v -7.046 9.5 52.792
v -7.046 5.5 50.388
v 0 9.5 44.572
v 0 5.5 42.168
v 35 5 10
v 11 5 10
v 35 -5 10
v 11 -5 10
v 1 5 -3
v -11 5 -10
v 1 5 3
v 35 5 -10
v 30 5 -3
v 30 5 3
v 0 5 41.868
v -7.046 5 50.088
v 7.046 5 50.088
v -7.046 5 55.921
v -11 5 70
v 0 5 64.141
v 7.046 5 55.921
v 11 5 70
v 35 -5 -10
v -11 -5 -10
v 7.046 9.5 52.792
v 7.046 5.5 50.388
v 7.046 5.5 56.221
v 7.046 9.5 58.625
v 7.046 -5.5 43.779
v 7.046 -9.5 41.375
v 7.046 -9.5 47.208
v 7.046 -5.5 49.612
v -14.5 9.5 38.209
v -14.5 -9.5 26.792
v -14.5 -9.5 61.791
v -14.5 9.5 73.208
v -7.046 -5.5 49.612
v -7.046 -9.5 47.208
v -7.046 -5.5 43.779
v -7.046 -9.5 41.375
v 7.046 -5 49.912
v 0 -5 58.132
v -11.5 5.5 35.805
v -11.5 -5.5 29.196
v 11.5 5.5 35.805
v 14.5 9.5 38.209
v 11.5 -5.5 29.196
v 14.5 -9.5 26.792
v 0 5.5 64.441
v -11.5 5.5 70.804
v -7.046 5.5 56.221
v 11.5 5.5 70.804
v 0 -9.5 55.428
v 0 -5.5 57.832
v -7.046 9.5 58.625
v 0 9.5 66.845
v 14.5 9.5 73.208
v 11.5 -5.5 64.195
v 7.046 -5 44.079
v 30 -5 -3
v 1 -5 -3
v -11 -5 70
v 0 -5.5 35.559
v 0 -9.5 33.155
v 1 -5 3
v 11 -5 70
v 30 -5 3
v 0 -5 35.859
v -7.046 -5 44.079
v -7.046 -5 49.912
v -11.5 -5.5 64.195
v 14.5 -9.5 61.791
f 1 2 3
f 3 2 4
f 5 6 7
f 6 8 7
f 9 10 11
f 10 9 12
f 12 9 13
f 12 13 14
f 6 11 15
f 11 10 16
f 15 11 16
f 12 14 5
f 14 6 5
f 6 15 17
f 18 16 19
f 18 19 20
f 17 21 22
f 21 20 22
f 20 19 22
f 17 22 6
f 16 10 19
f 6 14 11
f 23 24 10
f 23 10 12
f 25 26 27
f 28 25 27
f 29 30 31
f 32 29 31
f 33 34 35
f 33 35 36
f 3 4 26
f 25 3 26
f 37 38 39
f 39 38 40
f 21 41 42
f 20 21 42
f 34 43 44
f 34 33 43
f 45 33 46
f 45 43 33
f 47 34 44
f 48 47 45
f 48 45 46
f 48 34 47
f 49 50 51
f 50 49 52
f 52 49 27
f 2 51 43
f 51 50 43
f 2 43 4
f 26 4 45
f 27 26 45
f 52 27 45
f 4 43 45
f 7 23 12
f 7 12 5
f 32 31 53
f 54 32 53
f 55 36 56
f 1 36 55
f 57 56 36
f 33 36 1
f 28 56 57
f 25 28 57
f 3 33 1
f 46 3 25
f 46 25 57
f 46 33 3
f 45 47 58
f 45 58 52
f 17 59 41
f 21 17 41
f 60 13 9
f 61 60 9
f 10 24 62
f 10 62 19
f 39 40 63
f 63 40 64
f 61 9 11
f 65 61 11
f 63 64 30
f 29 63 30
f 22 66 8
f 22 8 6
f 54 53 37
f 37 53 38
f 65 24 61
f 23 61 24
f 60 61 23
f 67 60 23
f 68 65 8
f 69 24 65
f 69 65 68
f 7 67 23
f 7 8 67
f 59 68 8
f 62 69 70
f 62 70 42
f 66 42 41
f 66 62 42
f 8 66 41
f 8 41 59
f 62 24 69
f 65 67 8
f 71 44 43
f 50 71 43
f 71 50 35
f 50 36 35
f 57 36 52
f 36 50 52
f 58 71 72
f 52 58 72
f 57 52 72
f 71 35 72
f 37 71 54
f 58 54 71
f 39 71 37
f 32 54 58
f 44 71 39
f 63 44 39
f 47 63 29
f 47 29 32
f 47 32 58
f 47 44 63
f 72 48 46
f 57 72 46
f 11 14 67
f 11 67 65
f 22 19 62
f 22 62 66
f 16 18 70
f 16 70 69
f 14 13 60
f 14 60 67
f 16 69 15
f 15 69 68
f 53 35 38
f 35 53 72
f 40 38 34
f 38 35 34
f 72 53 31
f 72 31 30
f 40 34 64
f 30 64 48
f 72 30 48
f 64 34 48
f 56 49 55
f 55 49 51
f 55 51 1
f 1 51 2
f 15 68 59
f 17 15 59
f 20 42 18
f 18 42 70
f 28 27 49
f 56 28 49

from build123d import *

# Parameters (mm, degrees)
F0_W          = 22
F0_H          = 10
F1_DEPTH      = 70
F1_DEPTH_BACK = 10
F2_START      = 20
F0_W_2        = 29
F0_H_2        = 19
F0_W_3        = 23
F0_H_3        = 11
F2_DEPTH      = 60
F4_DEPTH      = 25
F5_ANGLE      = -31
F3_W          = 40
F3_H          = 30
F7_DEPTH      = 25
F8_ANGLE      = -31
F10_W         = 24
F10_H         = 20
F11_DEPTH     = 5
F12_W         = 29
F12_H         = 6
F13_DEPTH     = 25


with BuildPart() as f1:
    # F0 (on Top) → F1 (new body, two sides)
    with BuildSketch(Plane.XY) as f1_sk:
        Rectangle(F0_W, F0_H)
    extrude(amount=F1_DEPTH)
    extrude(f1_sk.sketch, amount=-F1_DEPTH_BACK)


with BuildPart() as f2:
    # F0 (on Top) → F2 (new body)
    with BuildSketch(Plane.XY.offset(F2_START)):
        Rectangle(F0_W_2, F0_H_2)
        Rectangle(F0_W_3, F0_H_3, mode=Mode.SUBTRACT)
    extrude(amount=F2_DEPTH)


with BuildPart() as f4:
    # F3 (on Front) → F4 (new body, symmetric)
    with BuildSketch(Plane.XZ):
        Polygon((7.045941546, 52.5), (0, 59.545941546), (-7.045941546, 52.5), (-7.045941546, 47.5), (0, 40.454058454), (7.045941546, 47.5), align=None)
    extrude(amount=F4_DEPTH, both=True)


with BuildPart() as f4_1:
    # F5: moved
    add(f4.part.rotate(Axis((-13.5051338822, 0, 50), (-1, 0, 0)), F5_ANGLE))


with BuildPart() as f2_1:
    add(f2.part)

    # F6: cut F4
    add(f4_1.part, mode=Mode.SUBTRACT)


with BuildPart() as f1_1:
    add(f1.part)

    # F6: cut F4
    add(f4_1.part, mode=Mode.SUBTRACT)

    # F10 (on Front) → F11 (join, symmetric)
    with BuildSketch(Plane.XZ):
        with Locations((23, 0)):
            Rectangle(F10_W, F10_H)
    extrude(amount=F11_DEPTH, both=True)

    # F12 (on face) → F13 (cut)
    with BuildSketch(Plane(origin=(0, 5, 0), x_dir=(-1, 0, 0), z_dir=(0, 1, 0))):
        with Locations((-15.5, 0)):
            Rectangle(F12_W, F12_H)
    extrude(amount=-F13_DEPTH, mode=Mode.SUBTRACT)


with BuildPart() as f7:
    # F3 (on Front) → F7 (new body, symmetric)
    with BuildSketch(Plane.XZ):
        with Locations((0, 50)):
            Rectangle(F3_W, F3_H)
        Polygon((-7.045941546, 52.5), (0, 59.545941546), (7.045941546, 52.5), (7.045941546, 47.5), (0, 40.454058454), (-7.045941546, 47.5), align=None, mode=Mode.SUBTRACT)
        Polygon((7.045941546, 52.5), (0, 59.545941546), (-7.045941546, 52.5), (-7.045941546, 47.5), (0, 40.454058454), (7.045941546, 47.5), align=None)
    extrude(amount=F7_DEPTH, both=True)


with BuildPart() as f7_1:
    # F8: moved
    add(f7.part.rotate(Axis((-13.5051338822, 0, 50), (-1, 0, 0)), F8_ANGLE))

    # F9: intersect F2
    add(f2_1.part, mode=Mode.INTERSECT)


solid = Compound([f1_1.part, f7_1.part])
